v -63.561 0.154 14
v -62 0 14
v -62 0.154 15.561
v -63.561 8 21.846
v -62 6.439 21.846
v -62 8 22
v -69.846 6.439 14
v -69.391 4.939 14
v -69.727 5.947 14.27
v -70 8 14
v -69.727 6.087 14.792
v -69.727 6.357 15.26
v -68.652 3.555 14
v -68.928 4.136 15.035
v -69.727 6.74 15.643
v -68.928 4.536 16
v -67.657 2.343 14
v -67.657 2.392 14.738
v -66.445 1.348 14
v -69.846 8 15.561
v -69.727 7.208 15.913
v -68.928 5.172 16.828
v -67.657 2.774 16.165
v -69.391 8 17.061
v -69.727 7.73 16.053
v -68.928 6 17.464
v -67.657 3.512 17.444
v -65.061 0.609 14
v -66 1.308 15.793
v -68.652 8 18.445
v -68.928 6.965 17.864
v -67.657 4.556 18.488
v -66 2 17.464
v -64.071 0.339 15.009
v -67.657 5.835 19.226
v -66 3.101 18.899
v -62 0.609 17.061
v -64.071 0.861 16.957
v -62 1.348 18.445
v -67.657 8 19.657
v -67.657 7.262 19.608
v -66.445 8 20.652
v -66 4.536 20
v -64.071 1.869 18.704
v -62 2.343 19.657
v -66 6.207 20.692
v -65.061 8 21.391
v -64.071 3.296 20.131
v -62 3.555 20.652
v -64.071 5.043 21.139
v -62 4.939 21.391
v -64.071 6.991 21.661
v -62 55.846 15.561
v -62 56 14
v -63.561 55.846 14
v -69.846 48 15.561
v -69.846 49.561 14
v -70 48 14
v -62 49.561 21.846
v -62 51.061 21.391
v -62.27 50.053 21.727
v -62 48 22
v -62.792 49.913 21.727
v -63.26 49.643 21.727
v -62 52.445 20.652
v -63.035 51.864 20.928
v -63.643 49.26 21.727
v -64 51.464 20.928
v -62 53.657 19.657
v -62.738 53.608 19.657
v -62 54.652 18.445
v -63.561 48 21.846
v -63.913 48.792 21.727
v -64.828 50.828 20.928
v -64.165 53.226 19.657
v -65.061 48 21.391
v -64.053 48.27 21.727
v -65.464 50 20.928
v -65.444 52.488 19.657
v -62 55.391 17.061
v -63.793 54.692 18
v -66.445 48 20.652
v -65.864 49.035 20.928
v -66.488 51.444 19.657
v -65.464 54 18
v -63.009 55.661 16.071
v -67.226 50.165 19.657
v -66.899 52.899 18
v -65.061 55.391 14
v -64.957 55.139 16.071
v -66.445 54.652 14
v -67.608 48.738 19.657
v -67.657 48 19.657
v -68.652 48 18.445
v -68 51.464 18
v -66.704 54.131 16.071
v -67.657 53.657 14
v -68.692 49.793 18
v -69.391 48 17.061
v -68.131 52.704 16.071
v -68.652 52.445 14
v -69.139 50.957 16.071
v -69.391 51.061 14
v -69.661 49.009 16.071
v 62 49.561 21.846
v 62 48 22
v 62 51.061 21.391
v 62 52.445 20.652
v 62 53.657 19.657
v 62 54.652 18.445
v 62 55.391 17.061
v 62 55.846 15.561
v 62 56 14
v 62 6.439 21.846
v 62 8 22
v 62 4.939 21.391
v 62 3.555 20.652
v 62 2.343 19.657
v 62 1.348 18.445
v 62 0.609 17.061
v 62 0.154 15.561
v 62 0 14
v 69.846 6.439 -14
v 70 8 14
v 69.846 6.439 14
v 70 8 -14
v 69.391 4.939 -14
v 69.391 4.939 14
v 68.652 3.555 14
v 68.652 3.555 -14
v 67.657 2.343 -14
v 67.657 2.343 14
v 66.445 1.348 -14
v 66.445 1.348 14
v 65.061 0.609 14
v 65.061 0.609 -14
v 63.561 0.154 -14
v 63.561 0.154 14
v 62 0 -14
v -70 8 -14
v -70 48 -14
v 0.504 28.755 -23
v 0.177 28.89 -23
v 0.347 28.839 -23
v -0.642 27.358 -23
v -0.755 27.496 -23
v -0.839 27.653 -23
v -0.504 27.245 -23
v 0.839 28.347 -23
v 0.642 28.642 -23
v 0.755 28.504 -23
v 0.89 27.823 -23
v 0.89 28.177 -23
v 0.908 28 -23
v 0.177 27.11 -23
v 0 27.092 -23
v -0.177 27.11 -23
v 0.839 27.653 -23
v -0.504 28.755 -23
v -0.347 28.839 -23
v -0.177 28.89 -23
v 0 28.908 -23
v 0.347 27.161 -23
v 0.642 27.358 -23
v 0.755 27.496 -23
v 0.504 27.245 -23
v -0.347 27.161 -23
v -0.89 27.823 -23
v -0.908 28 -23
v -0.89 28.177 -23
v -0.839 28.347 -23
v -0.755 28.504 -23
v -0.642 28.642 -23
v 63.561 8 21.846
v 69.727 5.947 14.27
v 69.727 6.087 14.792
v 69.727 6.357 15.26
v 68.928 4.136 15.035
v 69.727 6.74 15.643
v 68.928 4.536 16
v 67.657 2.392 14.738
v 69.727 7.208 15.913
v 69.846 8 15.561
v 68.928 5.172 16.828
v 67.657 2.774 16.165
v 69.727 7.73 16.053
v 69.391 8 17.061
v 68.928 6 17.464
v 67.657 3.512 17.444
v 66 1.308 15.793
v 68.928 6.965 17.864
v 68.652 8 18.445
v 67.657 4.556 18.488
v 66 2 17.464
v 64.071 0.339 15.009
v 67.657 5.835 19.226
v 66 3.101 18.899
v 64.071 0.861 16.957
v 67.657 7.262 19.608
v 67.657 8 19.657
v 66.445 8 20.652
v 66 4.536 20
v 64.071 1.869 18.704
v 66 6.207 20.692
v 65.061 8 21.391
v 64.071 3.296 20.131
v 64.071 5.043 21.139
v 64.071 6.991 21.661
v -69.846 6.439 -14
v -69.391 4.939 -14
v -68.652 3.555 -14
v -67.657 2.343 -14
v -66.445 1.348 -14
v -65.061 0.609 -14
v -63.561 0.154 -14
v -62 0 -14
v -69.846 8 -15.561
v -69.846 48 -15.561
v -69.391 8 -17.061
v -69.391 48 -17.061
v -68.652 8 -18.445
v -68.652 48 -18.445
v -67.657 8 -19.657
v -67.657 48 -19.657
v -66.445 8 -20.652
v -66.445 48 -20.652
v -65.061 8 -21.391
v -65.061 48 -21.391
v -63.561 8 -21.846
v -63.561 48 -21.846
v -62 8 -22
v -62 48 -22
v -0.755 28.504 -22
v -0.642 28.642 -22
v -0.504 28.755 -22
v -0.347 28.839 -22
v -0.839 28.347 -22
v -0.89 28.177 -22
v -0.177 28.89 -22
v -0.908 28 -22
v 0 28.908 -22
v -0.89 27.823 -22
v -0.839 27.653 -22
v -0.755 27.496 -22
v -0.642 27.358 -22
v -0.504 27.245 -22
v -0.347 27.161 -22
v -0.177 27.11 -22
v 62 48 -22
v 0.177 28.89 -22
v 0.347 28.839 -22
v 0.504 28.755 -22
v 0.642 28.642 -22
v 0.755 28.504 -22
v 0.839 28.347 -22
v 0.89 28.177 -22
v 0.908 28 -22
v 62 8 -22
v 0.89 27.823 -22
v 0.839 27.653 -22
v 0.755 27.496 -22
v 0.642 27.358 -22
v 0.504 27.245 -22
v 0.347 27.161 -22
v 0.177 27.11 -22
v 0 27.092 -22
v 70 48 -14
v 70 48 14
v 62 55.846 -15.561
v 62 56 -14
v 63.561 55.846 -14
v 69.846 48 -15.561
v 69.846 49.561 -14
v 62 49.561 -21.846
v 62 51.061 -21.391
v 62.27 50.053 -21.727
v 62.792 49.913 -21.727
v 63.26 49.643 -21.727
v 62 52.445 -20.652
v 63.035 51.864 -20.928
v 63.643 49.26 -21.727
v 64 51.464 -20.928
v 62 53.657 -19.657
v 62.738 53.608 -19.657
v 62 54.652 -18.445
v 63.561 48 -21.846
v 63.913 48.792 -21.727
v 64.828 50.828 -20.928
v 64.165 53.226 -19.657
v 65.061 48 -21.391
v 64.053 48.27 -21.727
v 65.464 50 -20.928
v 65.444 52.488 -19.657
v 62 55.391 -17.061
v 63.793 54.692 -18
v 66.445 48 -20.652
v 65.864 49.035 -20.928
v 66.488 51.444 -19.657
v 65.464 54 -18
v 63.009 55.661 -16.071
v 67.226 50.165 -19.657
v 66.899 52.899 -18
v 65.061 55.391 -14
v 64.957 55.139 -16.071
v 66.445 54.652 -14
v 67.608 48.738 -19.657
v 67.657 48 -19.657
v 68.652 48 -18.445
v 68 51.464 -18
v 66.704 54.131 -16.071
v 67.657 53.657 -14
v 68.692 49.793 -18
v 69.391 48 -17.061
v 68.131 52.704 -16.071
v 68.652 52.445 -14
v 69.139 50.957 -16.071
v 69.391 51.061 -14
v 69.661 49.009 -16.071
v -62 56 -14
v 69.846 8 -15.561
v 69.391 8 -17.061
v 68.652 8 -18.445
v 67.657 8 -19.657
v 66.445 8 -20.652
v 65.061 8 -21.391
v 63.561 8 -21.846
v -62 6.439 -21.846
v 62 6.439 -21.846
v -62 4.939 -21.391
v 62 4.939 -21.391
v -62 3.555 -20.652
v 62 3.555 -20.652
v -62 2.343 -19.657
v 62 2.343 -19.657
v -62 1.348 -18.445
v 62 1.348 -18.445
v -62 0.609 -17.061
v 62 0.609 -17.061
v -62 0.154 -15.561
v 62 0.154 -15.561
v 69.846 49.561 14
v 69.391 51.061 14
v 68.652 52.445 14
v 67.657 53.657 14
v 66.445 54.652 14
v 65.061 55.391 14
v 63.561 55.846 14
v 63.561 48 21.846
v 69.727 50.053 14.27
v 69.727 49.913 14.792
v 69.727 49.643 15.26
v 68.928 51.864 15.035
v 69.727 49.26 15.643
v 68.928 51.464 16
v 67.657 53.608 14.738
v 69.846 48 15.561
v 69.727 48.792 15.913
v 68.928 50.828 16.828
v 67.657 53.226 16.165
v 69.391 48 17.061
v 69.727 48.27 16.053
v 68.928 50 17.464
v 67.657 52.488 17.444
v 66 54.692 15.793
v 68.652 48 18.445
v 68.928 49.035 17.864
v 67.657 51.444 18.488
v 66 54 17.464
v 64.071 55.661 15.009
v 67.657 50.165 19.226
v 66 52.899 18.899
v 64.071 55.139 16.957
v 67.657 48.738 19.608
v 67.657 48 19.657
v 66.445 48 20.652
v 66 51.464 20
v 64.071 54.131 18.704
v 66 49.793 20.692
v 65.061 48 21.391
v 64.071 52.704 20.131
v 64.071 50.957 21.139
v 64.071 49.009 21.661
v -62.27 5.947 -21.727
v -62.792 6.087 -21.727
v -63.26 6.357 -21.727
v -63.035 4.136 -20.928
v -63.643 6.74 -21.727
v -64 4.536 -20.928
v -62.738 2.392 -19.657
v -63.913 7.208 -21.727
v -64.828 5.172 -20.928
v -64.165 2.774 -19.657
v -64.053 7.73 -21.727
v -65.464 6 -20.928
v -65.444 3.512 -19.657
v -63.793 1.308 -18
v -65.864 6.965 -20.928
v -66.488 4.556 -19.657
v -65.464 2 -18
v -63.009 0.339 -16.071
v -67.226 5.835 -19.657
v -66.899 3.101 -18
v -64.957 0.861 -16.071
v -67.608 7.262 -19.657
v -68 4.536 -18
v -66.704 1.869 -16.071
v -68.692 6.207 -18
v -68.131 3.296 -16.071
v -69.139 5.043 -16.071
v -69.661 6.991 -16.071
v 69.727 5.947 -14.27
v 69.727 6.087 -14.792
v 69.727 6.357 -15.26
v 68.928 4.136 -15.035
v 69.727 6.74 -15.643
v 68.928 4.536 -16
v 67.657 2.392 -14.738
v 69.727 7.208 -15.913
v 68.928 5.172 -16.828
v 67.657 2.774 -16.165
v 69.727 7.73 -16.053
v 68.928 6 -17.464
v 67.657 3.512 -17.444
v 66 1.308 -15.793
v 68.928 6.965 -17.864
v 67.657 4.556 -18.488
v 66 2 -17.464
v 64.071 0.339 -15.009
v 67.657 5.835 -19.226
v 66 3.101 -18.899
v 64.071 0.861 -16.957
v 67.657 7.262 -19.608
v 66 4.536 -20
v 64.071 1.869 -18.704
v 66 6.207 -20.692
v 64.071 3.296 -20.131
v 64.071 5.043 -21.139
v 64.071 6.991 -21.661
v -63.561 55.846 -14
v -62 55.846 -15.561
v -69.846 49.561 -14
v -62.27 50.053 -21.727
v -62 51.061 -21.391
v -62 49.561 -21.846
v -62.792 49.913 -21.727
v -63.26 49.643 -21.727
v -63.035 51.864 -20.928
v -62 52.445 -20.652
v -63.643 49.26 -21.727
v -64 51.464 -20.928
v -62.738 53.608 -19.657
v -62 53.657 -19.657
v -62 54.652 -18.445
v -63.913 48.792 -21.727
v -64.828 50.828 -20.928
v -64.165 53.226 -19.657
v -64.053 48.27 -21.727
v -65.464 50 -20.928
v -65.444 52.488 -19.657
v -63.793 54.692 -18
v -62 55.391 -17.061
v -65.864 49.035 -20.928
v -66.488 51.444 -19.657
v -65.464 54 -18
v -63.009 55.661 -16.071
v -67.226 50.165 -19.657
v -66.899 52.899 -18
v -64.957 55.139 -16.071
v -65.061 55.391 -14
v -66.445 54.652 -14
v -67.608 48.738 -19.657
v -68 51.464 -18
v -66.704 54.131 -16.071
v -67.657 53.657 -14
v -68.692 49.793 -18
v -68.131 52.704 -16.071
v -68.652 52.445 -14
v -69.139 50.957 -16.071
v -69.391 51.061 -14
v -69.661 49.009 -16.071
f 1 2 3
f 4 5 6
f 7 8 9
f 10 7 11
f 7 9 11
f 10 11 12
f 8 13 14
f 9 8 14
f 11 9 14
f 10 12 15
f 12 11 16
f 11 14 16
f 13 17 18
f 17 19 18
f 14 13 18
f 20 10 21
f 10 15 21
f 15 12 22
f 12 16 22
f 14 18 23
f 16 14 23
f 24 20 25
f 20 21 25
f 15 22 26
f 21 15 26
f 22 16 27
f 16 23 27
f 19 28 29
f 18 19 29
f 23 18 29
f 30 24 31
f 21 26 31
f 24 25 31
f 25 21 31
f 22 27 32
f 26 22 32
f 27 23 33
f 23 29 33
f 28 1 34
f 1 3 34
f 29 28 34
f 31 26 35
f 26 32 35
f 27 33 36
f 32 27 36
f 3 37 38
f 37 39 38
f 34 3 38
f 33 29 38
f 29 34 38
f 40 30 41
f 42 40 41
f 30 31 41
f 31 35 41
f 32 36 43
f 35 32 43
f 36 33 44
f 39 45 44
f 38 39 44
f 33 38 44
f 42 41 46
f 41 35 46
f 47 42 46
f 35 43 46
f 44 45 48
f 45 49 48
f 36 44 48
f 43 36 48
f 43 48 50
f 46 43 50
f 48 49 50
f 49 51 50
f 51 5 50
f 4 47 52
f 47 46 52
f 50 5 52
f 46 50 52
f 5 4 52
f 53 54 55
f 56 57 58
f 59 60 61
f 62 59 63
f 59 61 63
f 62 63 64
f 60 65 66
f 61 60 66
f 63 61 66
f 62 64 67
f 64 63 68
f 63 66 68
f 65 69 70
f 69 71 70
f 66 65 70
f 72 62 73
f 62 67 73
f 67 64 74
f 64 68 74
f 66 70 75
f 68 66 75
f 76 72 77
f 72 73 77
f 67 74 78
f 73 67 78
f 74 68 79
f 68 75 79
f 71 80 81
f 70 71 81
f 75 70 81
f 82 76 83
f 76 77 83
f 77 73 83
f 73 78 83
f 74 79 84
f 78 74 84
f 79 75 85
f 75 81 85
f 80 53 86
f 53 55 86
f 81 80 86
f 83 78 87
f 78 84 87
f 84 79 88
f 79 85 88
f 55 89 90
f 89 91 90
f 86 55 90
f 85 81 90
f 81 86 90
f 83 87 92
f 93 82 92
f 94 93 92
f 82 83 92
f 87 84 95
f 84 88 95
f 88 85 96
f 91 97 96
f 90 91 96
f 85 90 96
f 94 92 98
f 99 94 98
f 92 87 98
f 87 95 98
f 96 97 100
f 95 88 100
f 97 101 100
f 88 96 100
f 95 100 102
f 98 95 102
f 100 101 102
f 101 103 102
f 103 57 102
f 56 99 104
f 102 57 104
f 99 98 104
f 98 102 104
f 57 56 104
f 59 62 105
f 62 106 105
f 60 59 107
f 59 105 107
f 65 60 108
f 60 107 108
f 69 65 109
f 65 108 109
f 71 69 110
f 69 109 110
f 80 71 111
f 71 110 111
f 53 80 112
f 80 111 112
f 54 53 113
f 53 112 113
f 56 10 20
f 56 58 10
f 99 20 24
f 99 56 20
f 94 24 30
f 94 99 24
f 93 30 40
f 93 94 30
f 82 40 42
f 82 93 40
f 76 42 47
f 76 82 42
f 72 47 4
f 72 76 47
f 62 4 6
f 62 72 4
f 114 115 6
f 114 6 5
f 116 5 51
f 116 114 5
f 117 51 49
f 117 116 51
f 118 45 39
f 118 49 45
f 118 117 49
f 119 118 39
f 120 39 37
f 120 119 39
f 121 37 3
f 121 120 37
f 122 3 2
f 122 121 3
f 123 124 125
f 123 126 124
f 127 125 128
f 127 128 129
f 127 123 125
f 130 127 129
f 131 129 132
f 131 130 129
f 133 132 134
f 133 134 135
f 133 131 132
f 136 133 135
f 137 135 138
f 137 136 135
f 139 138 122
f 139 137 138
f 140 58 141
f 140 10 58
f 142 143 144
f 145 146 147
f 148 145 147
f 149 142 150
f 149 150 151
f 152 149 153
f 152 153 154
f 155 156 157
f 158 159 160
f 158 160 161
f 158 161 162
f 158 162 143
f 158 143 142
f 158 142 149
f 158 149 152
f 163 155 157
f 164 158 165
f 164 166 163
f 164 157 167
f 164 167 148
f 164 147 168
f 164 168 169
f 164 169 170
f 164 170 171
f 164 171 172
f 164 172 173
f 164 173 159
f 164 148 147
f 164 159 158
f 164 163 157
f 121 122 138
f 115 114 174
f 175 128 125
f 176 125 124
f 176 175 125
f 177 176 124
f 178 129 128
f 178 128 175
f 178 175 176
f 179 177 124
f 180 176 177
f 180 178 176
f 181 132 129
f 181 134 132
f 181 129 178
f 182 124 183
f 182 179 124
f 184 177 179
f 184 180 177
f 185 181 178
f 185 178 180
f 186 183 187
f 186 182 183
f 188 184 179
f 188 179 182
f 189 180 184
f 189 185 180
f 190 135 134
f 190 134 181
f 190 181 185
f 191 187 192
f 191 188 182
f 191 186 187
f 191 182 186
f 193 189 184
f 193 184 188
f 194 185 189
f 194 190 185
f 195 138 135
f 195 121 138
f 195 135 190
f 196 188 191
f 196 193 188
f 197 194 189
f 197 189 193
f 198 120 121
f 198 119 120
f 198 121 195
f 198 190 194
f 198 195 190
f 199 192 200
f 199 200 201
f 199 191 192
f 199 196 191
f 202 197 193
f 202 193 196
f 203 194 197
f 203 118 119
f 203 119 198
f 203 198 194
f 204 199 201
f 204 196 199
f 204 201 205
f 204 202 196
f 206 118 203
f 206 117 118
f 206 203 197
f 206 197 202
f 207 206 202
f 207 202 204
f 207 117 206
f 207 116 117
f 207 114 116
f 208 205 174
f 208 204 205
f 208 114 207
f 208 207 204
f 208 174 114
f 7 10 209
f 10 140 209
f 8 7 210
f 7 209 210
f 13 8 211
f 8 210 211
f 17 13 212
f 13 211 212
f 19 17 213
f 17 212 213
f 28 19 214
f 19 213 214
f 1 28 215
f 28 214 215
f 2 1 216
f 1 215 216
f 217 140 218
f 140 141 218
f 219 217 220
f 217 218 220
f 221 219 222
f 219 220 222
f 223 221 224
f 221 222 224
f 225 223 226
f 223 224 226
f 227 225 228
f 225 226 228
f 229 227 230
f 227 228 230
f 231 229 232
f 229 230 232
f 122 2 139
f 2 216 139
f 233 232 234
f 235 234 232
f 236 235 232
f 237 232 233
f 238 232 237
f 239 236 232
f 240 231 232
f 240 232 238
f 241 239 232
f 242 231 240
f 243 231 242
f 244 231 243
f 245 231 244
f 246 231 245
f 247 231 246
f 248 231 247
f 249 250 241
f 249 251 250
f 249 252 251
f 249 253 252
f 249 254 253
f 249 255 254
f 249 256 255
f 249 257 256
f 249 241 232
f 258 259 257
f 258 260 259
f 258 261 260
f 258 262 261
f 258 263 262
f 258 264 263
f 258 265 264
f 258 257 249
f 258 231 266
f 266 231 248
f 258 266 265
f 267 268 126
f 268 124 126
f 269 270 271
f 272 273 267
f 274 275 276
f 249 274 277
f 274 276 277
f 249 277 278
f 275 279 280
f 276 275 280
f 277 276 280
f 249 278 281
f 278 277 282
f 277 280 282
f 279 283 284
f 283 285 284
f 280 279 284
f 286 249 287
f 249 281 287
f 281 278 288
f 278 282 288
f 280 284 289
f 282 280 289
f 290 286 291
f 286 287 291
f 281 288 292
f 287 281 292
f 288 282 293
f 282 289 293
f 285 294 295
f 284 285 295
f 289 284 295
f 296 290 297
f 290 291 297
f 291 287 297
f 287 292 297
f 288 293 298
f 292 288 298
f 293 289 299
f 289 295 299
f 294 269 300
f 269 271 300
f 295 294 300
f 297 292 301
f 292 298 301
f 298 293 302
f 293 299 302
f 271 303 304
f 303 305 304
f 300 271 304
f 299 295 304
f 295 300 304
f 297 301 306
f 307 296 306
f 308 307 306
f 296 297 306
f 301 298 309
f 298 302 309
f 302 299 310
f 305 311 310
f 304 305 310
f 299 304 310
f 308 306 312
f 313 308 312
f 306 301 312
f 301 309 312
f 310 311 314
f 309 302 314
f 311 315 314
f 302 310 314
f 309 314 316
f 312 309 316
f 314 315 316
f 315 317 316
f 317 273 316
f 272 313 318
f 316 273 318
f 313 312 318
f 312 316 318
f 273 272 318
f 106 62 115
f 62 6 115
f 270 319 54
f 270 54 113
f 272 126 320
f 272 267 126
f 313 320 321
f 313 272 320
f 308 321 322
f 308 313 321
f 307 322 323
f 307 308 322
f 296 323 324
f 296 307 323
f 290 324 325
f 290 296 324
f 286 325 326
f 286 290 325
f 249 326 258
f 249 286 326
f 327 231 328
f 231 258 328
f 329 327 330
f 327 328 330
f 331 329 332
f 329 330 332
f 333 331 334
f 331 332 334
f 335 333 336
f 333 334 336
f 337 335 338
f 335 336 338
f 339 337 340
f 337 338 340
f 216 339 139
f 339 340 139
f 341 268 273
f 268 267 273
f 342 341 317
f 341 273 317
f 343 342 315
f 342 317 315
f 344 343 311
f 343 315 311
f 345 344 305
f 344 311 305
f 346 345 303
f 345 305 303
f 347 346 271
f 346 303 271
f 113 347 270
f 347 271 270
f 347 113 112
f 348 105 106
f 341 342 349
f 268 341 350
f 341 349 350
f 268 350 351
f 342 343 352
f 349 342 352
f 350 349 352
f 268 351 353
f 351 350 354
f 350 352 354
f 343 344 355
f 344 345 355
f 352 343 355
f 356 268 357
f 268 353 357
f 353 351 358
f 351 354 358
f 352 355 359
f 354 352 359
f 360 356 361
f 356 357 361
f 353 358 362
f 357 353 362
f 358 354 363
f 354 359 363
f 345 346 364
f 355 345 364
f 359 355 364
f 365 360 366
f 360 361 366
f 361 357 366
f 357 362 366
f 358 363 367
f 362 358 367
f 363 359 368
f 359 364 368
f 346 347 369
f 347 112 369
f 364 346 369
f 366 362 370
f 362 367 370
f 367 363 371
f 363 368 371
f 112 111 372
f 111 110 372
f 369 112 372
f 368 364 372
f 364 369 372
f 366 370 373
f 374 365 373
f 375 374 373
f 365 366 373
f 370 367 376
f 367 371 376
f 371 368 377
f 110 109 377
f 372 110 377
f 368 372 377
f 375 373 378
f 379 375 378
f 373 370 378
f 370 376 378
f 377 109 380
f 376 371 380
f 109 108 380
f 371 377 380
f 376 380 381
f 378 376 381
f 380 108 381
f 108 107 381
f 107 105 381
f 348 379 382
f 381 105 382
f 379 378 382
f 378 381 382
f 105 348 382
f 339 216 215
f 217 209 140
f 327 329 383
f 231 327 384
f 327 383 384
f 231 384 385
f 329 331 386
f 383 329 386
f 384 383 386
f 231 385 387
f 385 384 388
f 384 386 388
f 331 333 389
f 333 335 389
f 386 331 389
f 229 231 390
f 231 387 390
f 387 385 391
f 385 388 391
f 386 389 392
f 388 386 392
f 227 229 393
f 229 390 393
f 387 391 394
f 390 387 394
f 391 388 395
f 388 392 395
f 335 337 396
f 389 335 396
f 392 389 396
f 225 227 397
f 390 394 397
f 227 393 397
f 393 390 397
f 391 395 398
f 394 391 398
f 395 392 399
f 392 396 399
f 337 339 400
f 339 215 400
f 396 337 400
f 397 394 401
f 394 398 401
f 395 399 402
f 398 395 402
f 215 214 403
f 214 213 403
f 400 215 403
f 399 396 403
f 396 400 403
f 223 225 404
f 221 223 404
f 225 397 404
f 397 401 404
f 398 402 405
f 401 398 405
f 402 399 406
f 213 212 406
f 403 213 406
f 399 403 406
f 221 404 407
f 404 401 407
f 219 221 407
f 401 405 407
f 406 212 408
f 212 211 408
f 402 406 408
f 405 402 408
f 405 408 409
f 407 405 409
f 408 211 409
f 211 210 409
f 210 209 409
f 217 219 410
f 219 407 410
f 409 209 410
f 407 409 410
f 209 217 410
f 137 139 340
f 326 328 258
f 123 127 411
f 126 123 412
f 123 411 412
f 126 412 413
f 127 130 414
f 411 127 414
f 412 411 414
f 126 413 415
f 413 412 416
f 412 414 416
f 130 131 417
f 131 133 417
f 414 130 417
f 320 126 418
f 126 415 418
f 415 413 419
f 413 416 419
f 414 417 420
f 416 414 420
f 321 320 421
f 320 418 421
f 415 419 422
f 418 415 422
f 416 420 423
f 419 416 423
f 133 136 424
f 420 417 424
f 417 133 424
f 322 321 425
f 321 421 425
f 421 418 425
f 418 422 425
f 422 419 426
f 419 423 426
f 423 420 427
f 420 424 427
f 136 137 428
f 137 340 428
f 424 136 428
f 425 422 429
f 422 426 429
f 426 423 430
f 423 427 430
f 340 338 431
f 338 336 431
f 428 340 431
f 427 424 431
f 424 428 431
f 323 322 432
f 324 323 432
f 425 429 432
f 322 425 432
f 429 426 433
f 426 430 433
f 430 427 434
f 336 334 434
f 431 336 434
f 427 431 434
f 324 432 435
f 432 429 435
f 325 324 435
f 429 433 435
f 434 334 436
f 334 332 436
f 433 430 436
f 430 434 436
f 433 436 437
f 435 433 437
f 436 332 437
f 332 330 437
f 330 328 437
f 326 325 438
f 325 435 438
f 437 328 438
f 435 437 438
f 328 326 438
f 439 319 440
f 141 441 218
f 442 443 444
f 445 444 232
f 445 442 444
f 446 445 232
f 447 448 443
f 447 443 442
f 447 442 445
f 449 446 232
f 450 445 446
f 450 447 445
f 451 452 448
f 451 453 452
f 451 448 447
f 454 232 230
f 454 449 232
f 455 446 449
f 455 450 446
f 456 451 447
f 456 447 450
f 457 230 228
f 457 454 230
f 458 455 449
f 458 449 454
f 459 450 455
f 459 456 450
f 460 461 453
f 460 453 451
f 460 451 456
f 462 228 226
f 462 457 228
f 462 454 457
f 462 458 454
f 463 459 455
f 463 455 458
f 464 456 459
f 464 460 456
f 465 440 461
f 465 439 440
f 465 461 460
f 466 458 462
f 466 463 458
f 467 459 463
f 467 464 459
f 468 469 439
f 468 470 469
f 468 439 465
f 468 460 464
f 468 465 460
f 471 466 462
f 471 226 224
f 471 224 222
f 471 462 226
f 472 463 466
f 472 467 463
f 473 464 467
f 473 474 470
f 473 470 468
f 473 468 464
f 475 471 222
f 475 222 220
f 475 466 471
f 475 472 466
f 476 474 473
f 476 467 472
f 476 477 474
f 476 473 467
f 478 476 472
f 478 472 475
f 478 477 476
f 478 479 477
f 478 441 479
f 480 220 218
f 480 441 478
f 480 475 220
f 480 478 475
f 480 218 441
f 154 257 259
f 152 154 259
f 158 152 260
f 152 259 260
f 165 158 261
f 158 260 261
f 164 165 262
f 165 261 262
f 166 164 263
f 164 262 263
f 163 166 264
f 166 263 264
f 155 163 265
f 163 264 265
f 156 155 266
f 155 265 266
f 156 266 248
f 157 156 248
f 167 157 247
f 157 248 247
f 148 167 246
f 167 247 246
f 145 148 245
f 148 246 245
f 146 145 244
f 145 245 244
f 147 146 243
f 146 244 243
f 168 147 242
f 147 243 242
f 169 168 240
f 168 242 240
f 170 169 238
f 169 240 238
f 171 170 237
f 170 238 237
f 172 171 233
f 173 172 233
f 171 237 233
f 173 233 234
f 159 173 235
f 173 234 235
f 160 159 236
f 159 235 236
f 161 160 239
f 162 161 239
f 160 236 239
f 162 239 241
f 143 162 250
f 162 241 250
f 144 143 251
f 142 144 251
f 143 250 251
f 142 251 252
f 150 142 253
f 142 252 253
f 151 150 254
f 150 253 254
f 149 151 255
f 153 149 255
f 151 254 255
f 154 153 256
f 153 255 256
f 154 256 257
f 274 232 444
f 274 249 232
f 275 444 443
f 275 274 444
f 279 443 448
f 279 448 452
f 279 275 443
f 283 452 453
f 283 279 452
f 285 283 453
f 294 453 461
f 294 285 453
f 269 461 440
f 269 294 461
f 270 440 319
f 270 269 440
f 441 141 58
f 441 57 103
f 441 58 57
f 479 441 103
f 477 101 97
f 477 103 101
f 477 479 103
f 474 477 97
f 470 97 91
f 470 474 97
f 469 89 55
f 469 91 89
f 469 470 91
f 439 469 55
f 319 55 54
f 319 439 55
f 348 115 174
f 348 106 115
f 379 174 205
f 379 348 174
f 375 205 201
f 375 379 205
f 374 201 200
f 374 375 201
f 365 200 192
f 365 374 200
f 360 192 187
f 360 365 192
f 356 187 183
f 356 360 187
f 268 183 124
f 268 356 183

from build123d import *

# Parameters (mm, degrees)
SKETCH1_W           = 140
SKETCH1_H           = 44
BOSS_EXTRUDE1_DEPTH = 56
FILLET1_R           = 8
SKETCH2_R           = 0.907650606
BOSS_EXTRUDE2_DEPTH = 1


with BuildPart() as part:
    # Sketch1 → Boss-Extrude1 (new body)
    with BuildSketch(Plane(origin=(0, 0, 0), x_dir=(1, 0, 0), z_dir=(0, 1, 0))):
        Rectangle(SKETCH1_W, SKETCH1_H)
    extrude(amount=BOSS_EXTRUDE1_DEPTH)

    # Fillet1
    fillet1_edges = [part.edges().sort_by_distance(p)[0] for p in [
        (-70, 56, 0),
        (0, 56, 22),
        (70, 56, 0),
        (0, 0, 22),
        (-70, 0, 0),
        (0, 0, -22),
        (70, 0, 0),
        (0, 56, -22),
        (70, 28, 22),
        (-70, 28, 22),
        (-70, 28, -22),
        (70, 28, -22),
    ]]
    fillet(fillet1_edges, radius=FILLET1_R)

    # Sketch2 → Boss-Extrude2 (add)
    with BuildSketch(Plane(origin=(0, 0, -22), x_dir=(-1, 0, 0), z_dir=(0, 0, -1))):
        with Locations(Location((0, 28, 0), (0, 0, 180))):
            Circle(SKETCH2_R)
    extrude(amount=BOSS_EXTRUDE2_DEPTH)


solid = part.part
